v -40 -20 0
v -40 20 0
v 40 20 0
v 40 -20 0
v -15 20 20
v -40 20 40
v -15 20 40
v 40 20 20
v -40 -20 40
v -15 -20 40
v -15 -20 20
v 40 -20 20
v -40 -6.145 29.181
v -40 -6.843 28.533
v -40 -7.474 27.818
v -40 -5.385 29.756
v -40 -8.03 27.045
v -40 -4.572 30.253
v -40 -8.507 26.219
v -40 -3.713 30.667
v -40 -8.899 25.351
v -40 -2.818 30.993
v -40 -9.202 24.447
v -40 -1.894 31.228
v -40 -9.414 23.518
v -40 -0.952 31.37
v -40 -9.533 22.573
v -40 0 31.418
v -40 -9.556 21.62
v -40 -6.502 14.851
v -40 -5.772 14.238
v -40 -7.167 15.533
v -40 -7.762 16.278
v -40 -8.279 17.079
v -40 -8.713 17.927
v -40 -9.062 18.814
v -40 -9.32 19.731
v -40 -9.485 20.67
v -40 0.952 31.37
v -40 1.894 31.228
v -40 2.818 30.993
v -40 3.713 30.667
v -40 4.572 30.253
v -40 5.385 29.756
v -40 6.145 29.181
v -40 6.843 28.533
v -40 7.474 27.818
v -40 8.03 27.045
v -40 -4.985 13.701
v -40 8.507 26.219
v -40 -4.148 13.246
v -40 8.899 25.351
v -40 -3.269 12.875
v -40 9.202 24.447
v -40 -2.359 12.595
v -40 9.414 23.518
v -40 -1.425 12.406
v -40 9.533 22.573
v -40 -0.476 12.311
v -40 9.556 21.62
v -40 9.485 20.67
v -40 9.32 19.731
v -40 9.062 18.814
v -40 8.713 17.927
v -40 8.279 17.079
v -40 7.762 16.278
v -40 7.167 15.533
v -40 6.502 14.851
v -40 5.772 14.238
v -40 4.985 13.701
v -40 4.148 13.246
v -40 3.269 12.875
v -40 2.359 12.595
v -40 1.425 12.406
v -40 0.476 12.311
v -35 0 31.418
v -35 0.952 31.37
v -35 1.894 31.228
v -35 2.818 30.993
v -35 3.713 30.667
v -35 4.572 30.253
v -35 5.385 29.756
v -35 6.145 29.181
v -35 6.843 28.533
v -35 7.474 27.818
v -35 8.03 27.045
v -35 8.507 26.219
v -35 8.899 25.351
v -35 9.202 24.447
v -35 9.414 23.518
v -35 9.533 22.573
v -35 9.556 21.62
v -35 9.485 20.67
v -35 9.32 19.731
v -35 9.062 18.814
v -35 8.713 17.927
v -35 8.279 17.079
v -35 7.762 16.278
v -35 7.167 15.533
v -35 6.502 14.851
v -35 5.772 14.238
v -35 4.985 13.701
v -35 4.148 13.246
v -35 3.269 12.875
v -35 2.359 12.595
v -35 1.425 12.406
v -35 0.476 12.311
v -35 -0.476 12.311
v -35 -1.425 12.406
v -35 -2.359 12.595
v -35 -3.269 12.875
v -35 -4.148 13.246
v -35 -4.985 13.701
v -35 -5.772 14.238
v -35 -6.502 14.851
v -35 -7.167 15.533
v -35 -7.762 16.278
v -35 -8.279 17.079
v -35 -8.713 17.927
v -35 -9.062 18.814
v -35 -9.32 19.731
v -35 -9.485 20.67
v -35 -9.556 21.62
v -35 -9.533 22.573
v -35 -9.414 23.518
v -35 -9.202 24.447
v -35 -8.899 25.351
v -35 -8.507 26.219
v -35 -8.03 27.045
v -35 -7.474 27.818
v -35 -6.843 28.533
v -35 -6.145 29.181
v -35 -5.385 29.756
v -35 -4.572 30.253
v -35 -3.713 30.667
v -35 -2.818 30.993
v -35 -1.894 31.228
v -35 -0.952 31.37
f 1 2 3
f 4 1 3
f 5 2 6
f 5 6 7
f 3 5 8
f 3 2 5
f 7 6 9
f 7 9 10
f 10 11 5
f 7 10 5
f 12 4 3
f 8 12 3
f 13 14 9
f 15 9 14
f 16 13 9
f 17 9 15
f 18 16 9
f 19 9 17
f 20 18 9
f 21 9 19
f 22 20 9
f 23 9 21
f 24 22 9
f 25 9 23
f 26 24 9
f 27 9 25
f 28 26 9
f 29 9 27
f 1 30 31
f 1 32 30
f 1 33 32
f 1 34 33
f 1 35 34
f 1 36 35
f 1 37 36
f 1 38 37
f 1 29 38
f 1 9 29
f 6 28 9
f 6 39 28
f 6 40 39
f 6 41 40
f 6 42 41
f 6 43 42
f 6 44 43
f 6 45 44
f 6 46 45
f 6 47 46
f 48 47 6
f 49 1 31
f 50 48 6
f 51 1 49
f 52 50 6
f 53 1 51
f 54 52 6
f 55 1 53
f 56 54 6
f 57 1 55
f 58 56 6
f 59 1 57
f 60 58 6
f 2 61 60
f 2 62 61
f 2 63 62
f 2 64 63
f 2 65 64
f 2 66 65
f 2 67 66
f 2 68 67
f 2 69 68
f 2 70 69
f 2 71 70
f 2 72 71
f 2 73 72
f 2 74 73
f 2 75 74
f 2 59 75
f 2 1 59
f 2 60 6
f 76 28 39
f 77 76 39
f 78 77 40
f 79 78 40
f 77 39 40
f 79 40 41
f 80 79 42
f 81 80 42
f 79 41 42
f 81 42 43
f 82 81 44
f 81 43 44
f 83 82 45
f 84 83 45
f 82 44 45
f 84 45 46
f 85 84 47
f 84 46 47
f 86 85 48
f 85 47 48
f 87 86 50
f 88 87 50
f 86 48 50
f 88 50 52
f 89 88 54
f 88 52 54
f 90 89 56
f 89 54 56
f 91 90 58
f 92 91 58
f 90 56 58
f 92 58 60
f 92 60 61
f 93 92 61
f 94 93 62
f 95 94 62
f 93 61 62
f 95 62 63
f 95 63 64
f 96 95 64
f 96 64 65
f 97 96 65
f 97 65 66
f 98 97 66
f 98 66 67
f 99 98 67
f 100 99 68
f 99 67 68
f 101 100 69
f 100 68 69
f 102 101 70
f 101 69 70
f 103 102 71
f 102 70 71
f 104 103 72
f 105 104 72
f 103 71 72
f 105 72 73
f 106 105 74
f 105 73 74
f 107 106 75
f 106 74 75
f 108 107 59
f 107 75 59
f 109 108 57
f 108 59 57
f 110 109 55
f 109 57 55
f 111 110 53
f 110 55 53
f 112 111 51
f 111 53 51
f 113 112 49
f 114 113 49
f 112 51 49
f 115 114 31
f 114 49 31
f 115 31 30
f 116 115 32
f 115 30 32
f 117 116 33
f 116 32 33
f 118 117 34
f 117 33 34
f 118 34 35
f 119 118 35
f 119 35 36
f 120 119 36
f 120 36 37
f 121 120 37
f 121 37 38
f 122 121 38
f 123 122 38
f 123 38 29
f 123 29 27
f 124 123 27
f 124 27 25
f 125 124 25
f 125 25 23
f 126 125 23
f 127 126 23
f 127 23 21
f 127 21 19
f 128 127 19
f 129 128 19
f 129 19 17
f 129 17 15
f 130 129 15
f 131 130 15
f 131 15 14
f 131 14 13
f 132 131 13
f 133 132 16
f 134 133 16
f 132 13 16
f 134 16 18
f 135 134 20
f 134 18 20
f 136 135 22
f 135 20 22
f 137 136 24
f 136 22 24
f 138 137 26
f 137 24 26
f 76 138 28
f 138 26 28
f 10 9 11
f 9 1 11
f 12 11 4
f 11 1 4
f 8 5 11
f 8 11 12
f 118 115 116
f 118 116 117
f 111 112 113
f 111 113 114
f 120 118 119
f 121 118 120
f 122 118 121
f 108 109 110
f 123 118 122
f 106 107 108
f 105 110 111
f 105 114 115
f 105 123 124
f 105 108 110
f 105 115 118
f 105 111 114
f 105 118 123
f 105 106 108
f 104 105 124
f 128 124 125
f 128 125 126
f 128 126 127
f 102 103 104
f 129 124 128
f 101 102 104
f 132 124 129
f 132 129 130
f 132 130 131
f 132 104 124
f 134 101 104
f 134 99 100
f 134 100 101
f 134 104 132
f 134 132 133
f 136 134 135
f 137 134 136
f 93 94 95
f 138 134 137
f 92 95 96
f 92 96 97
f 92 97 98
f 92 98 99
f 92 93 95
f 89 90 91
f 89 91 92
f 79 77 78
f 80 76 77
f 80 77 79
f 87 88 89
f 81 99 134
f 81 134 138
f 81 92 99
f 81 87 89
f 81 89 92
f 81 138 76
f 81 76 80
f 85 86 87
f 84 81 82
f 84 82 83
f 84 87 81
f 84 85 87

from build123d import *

# Parameters (mm, degrees)
SKETCH_1_W          = 80
SKETCH_1_H          = 40
EXTRUDE_1_DEPTH     = 20
SKETCH_2_W          = 25
SKETCH_2_H          = 40
EXTRUDE_2_DEPTH     = 20
SKETCH_3_R          = 9.55930051
CUT_EXTRUDE_1_DEPTH = 5


with BuildPart() as part:
    # 草图1 → 凸台-拉伸1 (new body)
    with BuildSketch(Plane.XY):
        Rectangle(SKETCH_1_W, SKETCH_1_H)
    extrude(amount=EXTRUDE_1_DEPTH)

    # 草图2 → 凸台-拉伸2 (add)
    with BuildSketch(Plane.XY.offset(20)):
        with Locations((-27.5, 0)):
            Rectangle(SKETCH_2_W, SKETCH_2_H)
    extrude(amount=EXTRUDE_2_DEPTH)

    # 草图3 → 切除-拉伸1 (cut)
    with BuildSketch(Plane.ZY.offset(40)):
        with Locations((21.858234258, 0)):
            Circle(SKETCH_3_R)
    extrude(amount=-CUT_EXTRUDE_1_DEPTH, mode=Mode.SUBTRACT)


solid = part.part
